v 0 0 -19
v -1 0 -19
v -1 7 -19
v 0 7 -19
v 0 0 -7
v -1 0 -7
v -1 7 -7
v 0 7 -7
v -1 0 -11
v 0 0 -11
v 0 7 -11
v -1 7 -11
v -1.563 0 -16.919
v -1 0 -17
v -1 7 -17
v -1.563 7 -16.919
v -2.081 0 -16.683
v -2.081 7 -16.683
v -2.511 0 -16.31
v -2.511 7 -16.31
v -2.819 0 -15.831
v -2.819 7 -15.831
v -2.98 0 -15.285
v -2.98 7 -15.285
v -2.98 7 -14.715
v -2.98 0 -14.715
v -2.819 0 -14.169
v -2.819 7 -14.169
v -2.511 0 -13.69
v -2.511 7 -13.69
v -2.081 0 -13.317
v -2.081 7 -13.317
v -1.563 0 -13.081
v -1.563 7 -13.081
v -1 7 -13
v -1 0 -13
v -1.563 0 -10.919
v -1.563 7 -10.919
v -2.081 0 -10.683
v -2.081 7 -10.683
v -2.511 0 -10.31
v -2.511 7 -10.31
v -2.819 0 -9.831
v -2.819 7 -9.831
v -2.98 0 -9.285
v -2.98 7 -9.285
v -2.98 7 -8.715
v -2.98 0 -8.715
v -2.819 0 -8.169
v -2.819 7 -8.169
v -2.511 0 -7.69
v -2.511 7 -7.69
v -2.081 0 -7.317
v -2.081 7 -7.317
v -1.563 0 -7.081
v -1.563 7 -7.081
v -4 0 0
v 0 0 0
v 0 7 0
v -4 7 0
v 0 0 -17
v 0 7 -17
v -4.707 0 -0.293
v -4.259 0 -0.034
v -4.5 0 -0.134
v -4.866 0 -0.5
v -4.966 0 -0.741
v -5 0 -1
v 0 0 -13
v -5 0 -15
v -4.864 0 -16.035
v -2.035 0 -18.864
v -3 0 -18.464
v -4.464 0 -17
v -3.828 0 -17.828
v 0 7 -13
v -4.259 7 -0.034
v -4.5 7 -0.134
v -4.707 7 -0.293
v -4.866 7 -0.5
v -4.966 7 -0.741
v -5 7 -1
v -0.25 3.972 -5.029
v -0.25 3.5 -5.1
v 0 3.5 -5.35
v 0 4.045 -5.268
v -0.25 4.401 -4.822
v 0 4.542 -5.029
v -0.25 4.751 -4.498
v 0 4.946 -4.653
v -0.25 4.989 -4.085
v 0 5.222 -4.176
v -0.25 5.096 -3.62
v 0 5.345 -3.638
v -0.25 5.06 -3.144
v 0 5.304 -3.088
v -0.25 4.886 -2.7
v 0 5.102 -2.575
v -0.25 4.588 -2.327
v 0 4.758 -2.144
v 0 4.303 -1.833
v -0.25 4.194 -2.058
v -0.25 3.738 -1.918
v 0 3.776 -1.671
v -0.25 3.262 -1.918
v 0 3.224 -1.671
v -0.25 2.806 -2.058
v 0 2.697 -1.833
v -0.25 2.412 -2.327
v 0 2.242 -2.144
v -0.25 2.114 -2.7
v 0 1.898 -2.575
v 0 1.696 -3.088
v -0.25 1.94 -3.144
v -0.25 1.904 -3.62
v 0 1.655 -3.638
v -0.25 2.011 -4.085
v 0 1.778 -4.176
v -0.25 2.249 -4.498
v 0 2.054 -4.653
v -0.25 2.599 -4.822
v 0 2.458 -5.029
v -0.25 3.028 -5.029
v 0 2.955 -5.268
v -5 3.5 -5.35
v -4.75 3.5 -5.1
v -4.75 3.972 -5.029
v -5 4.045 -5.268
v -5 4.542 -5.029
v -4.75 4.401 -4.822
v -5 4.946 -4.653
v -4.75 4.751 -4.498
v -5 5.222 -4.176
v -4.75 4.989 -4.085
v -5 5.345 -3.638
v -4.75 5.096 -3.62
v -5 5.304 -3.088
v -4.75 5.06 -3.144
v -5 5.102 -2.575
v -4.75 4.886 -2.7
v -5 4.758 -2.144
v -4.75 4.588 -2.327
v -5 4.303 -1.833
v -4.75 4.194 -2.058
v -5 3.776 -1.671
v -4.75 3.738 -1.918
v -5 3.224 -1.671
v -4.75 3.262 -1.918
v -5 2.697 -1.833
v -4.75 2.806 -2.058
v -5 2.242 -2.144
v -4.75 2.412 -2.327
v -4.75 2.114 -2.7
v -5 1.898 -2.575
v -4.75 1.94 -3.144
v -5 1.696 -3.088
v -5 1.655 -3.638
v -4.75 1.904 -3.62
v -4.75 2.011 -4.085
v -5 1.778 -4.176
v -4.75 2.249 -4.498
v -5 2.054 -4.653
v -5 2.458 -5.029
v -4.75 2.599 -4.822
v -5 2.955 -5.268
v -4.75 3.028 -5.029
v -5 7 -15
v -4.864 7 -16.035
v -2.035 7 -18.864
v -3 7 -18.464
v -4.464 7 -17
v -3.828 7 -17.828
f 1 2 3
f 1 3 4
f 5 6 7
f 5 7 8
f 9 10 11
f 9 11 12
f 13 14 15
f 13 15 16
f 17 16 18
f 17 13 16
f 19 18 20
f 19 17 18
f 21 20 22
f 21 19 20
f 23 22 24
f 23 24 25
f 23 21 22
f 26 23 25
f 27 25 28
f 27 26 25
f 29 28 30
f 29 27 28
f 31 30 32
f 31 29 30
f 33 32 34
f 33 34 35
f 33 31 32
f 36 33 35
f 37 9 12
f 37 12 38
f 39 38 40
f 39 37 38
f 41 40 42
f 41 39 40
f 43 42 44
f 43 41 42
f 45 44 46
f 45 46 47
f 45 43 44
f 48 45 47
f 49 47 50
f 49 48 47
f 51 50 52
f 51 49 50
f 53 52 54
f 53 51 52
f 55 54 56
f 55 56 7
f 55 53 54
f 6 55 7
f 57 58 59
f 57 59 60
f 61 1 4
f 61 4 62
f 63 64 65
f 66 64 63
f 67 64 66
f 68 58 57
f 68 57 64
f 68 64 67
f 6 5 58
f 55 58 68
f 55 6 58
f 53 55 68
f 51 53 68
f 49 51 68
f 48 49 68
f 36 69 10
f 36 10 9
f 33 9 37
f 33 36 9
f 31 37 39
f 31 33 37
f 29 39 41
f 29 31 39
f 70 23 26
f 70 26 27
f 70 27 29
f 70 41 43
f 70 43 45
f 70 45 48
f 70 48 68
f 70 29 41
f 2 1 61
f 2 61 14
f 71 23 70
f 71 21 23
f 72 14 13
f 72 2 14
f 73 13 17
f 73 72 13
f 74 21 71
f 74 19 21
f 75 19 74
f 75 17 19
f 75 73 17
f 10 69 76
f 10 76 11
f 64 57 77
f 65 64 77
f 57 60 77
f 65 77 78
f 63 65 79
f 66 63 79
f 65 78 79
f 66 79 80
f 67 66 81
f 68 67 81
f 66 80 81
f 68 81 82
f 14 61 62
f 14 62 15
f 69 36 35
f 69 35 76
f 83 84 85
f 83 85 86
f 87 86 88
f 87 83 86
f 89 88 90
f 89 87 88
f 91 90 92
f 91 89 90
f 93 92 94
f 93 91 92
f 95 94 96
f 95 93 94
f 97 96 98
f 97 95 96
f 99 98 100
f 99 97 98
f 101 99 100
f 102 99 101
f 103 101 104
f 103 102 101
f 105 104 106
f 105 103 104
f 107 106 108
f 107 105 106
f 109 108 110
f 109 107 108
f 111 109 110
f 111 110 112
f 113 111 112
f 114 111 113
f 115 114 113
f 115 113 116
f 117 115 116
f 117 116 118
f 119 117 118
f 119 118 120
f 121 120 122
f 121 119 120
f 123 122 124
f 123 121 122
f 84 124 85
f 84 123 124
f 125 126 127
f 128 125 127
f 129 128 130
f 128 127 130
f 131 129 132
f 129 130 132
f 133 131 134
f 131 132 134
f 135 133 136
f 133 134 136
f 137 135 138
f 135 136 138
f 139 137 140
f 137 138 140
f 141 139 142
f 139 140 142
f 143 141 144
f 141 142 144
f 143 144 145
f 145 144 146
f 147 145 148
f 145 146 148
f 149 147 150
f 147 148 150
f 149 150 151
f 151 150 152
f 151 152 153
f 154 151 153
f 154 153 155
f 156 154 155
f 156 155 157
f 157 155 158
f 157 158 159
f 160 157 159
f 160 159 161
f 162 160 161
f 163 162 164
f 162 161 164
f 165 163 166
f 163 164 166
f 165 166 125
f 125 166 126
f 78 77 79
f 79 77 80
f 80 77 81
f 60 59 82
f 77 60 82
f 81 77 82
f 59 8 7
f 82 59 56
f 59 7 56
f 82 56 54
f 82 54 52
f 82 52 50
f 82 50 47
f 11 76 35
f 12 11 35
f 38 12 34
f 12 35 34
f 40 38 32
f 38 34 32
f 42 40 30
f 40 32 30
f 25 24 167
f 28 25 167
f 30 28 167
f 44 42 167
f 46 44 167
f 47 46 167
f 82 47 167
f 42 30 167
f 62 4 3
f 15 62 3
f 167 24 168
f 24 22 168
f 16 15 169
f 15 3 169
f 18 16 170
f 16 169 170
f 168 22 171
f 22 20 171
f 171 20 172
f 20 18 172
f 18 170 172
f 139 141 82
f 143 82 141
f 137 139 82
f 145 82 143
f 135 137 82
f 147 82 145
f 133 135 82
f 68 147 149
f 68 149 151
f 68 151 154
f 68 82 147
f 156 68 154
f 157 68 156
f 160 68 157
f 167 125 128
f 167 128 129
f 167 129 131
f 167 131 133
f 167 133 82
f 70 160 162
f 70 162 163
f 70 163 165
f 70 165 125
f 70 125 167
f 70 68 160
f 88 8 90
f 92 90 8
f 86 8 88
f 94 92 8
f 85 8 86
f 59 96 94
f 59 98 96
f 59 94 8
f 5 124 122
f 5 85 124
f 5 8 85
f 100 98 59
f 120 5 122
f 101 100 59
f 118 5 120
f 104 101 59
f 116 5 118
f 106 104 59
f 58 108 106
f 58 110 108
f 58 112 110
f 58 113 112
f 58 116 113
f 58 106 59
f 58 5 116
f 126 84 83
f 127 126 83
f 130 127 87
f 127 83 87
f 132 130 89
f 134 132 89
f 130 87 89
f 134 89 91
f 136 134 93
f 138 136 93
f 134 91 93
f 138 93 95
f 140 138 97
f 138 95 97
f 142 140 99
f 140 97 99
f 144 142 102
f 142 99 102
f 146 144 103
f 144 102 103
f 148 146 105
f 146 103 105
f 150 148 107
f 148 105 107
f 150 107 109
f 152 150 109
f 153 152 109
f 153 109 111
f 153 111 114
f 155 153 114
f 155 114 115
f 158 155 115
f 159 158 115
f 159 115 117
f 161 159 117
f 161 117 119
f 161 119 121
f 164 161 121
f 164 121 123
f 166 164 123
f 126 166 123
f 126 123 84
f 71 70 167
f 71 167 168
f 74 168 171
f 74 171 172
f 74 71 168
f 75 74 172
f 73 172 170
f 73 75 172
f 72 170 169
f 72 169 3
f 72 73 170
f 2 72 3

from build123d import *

# Parameters (mm, degrees)
BOSS_EXTRUDE1_DEPTH  = 7
M3_CLEARANCE_HOLE1_D = 3.2
CHAMFER2_SIZE        = 0.25
FILLET1_R            = 1


with BuildPart() as part:
    # Sketch1 → Boss-Extrude1 (new body)
    with BuildSketch(Plane(origin=(0, 0, 0), x_dir=(1, 0, 0), z_dir=(0, 1, 0))):
        with BuildLine():
            Line((0, 0), (-5, 0))
            Line((-5, 0), (-5, 9))
            Line((-5, 9), (-5, 15))
            ThreePointArc((-5, 15), (-3.828427125, 17.828427125), (-1, 19))
            Line((-1, 19), (0, 19))
            Line((0, 19), (0, 17))
            Line((0, 17), (-1, 17))
            ThreePointArc((-1, 17), (-3, 15), (-1, 13))
            Line((-1, 13), (0, 13))
            Line((0, 13), (0, 11))
            Line((0, 11), (-1, 11))
            ThreePointArc((-1, 11), (-3, 9), (-1, 7))
            Line((-1, 7), (0, 7))
            Line((0, 7), (0, 0))
        make_face()
    extrude(amount=BOSS_EXTRUDE1_DEPTH)

    # M3 Clearance Hole1 (through all)
    with Locations(Plane.ZY.offset(5)):
        with Locations((-3.5, 3.5)):
            Hole(M3_CLEARANCE_HOLE1_D / 2)

    # Chamfer2
    chamfer2_edges = [part.edges().sort_by_distance(p)[0] for p in [
        (-5, 3.5, -1.9),
        (0, 3.5, -1.9),
    ]]
    chamfer(chamfer2_edges, length=CHAMFER2_SIZE)

    # Fillet1
    fillet1_edges = [part.edges().sort_by_distance(p)[0] for p in [
        (-5, 3.5, 0),
    ]]
    fillet(fillet1_edges, radius=FILLET1_R)


solid = part.part
